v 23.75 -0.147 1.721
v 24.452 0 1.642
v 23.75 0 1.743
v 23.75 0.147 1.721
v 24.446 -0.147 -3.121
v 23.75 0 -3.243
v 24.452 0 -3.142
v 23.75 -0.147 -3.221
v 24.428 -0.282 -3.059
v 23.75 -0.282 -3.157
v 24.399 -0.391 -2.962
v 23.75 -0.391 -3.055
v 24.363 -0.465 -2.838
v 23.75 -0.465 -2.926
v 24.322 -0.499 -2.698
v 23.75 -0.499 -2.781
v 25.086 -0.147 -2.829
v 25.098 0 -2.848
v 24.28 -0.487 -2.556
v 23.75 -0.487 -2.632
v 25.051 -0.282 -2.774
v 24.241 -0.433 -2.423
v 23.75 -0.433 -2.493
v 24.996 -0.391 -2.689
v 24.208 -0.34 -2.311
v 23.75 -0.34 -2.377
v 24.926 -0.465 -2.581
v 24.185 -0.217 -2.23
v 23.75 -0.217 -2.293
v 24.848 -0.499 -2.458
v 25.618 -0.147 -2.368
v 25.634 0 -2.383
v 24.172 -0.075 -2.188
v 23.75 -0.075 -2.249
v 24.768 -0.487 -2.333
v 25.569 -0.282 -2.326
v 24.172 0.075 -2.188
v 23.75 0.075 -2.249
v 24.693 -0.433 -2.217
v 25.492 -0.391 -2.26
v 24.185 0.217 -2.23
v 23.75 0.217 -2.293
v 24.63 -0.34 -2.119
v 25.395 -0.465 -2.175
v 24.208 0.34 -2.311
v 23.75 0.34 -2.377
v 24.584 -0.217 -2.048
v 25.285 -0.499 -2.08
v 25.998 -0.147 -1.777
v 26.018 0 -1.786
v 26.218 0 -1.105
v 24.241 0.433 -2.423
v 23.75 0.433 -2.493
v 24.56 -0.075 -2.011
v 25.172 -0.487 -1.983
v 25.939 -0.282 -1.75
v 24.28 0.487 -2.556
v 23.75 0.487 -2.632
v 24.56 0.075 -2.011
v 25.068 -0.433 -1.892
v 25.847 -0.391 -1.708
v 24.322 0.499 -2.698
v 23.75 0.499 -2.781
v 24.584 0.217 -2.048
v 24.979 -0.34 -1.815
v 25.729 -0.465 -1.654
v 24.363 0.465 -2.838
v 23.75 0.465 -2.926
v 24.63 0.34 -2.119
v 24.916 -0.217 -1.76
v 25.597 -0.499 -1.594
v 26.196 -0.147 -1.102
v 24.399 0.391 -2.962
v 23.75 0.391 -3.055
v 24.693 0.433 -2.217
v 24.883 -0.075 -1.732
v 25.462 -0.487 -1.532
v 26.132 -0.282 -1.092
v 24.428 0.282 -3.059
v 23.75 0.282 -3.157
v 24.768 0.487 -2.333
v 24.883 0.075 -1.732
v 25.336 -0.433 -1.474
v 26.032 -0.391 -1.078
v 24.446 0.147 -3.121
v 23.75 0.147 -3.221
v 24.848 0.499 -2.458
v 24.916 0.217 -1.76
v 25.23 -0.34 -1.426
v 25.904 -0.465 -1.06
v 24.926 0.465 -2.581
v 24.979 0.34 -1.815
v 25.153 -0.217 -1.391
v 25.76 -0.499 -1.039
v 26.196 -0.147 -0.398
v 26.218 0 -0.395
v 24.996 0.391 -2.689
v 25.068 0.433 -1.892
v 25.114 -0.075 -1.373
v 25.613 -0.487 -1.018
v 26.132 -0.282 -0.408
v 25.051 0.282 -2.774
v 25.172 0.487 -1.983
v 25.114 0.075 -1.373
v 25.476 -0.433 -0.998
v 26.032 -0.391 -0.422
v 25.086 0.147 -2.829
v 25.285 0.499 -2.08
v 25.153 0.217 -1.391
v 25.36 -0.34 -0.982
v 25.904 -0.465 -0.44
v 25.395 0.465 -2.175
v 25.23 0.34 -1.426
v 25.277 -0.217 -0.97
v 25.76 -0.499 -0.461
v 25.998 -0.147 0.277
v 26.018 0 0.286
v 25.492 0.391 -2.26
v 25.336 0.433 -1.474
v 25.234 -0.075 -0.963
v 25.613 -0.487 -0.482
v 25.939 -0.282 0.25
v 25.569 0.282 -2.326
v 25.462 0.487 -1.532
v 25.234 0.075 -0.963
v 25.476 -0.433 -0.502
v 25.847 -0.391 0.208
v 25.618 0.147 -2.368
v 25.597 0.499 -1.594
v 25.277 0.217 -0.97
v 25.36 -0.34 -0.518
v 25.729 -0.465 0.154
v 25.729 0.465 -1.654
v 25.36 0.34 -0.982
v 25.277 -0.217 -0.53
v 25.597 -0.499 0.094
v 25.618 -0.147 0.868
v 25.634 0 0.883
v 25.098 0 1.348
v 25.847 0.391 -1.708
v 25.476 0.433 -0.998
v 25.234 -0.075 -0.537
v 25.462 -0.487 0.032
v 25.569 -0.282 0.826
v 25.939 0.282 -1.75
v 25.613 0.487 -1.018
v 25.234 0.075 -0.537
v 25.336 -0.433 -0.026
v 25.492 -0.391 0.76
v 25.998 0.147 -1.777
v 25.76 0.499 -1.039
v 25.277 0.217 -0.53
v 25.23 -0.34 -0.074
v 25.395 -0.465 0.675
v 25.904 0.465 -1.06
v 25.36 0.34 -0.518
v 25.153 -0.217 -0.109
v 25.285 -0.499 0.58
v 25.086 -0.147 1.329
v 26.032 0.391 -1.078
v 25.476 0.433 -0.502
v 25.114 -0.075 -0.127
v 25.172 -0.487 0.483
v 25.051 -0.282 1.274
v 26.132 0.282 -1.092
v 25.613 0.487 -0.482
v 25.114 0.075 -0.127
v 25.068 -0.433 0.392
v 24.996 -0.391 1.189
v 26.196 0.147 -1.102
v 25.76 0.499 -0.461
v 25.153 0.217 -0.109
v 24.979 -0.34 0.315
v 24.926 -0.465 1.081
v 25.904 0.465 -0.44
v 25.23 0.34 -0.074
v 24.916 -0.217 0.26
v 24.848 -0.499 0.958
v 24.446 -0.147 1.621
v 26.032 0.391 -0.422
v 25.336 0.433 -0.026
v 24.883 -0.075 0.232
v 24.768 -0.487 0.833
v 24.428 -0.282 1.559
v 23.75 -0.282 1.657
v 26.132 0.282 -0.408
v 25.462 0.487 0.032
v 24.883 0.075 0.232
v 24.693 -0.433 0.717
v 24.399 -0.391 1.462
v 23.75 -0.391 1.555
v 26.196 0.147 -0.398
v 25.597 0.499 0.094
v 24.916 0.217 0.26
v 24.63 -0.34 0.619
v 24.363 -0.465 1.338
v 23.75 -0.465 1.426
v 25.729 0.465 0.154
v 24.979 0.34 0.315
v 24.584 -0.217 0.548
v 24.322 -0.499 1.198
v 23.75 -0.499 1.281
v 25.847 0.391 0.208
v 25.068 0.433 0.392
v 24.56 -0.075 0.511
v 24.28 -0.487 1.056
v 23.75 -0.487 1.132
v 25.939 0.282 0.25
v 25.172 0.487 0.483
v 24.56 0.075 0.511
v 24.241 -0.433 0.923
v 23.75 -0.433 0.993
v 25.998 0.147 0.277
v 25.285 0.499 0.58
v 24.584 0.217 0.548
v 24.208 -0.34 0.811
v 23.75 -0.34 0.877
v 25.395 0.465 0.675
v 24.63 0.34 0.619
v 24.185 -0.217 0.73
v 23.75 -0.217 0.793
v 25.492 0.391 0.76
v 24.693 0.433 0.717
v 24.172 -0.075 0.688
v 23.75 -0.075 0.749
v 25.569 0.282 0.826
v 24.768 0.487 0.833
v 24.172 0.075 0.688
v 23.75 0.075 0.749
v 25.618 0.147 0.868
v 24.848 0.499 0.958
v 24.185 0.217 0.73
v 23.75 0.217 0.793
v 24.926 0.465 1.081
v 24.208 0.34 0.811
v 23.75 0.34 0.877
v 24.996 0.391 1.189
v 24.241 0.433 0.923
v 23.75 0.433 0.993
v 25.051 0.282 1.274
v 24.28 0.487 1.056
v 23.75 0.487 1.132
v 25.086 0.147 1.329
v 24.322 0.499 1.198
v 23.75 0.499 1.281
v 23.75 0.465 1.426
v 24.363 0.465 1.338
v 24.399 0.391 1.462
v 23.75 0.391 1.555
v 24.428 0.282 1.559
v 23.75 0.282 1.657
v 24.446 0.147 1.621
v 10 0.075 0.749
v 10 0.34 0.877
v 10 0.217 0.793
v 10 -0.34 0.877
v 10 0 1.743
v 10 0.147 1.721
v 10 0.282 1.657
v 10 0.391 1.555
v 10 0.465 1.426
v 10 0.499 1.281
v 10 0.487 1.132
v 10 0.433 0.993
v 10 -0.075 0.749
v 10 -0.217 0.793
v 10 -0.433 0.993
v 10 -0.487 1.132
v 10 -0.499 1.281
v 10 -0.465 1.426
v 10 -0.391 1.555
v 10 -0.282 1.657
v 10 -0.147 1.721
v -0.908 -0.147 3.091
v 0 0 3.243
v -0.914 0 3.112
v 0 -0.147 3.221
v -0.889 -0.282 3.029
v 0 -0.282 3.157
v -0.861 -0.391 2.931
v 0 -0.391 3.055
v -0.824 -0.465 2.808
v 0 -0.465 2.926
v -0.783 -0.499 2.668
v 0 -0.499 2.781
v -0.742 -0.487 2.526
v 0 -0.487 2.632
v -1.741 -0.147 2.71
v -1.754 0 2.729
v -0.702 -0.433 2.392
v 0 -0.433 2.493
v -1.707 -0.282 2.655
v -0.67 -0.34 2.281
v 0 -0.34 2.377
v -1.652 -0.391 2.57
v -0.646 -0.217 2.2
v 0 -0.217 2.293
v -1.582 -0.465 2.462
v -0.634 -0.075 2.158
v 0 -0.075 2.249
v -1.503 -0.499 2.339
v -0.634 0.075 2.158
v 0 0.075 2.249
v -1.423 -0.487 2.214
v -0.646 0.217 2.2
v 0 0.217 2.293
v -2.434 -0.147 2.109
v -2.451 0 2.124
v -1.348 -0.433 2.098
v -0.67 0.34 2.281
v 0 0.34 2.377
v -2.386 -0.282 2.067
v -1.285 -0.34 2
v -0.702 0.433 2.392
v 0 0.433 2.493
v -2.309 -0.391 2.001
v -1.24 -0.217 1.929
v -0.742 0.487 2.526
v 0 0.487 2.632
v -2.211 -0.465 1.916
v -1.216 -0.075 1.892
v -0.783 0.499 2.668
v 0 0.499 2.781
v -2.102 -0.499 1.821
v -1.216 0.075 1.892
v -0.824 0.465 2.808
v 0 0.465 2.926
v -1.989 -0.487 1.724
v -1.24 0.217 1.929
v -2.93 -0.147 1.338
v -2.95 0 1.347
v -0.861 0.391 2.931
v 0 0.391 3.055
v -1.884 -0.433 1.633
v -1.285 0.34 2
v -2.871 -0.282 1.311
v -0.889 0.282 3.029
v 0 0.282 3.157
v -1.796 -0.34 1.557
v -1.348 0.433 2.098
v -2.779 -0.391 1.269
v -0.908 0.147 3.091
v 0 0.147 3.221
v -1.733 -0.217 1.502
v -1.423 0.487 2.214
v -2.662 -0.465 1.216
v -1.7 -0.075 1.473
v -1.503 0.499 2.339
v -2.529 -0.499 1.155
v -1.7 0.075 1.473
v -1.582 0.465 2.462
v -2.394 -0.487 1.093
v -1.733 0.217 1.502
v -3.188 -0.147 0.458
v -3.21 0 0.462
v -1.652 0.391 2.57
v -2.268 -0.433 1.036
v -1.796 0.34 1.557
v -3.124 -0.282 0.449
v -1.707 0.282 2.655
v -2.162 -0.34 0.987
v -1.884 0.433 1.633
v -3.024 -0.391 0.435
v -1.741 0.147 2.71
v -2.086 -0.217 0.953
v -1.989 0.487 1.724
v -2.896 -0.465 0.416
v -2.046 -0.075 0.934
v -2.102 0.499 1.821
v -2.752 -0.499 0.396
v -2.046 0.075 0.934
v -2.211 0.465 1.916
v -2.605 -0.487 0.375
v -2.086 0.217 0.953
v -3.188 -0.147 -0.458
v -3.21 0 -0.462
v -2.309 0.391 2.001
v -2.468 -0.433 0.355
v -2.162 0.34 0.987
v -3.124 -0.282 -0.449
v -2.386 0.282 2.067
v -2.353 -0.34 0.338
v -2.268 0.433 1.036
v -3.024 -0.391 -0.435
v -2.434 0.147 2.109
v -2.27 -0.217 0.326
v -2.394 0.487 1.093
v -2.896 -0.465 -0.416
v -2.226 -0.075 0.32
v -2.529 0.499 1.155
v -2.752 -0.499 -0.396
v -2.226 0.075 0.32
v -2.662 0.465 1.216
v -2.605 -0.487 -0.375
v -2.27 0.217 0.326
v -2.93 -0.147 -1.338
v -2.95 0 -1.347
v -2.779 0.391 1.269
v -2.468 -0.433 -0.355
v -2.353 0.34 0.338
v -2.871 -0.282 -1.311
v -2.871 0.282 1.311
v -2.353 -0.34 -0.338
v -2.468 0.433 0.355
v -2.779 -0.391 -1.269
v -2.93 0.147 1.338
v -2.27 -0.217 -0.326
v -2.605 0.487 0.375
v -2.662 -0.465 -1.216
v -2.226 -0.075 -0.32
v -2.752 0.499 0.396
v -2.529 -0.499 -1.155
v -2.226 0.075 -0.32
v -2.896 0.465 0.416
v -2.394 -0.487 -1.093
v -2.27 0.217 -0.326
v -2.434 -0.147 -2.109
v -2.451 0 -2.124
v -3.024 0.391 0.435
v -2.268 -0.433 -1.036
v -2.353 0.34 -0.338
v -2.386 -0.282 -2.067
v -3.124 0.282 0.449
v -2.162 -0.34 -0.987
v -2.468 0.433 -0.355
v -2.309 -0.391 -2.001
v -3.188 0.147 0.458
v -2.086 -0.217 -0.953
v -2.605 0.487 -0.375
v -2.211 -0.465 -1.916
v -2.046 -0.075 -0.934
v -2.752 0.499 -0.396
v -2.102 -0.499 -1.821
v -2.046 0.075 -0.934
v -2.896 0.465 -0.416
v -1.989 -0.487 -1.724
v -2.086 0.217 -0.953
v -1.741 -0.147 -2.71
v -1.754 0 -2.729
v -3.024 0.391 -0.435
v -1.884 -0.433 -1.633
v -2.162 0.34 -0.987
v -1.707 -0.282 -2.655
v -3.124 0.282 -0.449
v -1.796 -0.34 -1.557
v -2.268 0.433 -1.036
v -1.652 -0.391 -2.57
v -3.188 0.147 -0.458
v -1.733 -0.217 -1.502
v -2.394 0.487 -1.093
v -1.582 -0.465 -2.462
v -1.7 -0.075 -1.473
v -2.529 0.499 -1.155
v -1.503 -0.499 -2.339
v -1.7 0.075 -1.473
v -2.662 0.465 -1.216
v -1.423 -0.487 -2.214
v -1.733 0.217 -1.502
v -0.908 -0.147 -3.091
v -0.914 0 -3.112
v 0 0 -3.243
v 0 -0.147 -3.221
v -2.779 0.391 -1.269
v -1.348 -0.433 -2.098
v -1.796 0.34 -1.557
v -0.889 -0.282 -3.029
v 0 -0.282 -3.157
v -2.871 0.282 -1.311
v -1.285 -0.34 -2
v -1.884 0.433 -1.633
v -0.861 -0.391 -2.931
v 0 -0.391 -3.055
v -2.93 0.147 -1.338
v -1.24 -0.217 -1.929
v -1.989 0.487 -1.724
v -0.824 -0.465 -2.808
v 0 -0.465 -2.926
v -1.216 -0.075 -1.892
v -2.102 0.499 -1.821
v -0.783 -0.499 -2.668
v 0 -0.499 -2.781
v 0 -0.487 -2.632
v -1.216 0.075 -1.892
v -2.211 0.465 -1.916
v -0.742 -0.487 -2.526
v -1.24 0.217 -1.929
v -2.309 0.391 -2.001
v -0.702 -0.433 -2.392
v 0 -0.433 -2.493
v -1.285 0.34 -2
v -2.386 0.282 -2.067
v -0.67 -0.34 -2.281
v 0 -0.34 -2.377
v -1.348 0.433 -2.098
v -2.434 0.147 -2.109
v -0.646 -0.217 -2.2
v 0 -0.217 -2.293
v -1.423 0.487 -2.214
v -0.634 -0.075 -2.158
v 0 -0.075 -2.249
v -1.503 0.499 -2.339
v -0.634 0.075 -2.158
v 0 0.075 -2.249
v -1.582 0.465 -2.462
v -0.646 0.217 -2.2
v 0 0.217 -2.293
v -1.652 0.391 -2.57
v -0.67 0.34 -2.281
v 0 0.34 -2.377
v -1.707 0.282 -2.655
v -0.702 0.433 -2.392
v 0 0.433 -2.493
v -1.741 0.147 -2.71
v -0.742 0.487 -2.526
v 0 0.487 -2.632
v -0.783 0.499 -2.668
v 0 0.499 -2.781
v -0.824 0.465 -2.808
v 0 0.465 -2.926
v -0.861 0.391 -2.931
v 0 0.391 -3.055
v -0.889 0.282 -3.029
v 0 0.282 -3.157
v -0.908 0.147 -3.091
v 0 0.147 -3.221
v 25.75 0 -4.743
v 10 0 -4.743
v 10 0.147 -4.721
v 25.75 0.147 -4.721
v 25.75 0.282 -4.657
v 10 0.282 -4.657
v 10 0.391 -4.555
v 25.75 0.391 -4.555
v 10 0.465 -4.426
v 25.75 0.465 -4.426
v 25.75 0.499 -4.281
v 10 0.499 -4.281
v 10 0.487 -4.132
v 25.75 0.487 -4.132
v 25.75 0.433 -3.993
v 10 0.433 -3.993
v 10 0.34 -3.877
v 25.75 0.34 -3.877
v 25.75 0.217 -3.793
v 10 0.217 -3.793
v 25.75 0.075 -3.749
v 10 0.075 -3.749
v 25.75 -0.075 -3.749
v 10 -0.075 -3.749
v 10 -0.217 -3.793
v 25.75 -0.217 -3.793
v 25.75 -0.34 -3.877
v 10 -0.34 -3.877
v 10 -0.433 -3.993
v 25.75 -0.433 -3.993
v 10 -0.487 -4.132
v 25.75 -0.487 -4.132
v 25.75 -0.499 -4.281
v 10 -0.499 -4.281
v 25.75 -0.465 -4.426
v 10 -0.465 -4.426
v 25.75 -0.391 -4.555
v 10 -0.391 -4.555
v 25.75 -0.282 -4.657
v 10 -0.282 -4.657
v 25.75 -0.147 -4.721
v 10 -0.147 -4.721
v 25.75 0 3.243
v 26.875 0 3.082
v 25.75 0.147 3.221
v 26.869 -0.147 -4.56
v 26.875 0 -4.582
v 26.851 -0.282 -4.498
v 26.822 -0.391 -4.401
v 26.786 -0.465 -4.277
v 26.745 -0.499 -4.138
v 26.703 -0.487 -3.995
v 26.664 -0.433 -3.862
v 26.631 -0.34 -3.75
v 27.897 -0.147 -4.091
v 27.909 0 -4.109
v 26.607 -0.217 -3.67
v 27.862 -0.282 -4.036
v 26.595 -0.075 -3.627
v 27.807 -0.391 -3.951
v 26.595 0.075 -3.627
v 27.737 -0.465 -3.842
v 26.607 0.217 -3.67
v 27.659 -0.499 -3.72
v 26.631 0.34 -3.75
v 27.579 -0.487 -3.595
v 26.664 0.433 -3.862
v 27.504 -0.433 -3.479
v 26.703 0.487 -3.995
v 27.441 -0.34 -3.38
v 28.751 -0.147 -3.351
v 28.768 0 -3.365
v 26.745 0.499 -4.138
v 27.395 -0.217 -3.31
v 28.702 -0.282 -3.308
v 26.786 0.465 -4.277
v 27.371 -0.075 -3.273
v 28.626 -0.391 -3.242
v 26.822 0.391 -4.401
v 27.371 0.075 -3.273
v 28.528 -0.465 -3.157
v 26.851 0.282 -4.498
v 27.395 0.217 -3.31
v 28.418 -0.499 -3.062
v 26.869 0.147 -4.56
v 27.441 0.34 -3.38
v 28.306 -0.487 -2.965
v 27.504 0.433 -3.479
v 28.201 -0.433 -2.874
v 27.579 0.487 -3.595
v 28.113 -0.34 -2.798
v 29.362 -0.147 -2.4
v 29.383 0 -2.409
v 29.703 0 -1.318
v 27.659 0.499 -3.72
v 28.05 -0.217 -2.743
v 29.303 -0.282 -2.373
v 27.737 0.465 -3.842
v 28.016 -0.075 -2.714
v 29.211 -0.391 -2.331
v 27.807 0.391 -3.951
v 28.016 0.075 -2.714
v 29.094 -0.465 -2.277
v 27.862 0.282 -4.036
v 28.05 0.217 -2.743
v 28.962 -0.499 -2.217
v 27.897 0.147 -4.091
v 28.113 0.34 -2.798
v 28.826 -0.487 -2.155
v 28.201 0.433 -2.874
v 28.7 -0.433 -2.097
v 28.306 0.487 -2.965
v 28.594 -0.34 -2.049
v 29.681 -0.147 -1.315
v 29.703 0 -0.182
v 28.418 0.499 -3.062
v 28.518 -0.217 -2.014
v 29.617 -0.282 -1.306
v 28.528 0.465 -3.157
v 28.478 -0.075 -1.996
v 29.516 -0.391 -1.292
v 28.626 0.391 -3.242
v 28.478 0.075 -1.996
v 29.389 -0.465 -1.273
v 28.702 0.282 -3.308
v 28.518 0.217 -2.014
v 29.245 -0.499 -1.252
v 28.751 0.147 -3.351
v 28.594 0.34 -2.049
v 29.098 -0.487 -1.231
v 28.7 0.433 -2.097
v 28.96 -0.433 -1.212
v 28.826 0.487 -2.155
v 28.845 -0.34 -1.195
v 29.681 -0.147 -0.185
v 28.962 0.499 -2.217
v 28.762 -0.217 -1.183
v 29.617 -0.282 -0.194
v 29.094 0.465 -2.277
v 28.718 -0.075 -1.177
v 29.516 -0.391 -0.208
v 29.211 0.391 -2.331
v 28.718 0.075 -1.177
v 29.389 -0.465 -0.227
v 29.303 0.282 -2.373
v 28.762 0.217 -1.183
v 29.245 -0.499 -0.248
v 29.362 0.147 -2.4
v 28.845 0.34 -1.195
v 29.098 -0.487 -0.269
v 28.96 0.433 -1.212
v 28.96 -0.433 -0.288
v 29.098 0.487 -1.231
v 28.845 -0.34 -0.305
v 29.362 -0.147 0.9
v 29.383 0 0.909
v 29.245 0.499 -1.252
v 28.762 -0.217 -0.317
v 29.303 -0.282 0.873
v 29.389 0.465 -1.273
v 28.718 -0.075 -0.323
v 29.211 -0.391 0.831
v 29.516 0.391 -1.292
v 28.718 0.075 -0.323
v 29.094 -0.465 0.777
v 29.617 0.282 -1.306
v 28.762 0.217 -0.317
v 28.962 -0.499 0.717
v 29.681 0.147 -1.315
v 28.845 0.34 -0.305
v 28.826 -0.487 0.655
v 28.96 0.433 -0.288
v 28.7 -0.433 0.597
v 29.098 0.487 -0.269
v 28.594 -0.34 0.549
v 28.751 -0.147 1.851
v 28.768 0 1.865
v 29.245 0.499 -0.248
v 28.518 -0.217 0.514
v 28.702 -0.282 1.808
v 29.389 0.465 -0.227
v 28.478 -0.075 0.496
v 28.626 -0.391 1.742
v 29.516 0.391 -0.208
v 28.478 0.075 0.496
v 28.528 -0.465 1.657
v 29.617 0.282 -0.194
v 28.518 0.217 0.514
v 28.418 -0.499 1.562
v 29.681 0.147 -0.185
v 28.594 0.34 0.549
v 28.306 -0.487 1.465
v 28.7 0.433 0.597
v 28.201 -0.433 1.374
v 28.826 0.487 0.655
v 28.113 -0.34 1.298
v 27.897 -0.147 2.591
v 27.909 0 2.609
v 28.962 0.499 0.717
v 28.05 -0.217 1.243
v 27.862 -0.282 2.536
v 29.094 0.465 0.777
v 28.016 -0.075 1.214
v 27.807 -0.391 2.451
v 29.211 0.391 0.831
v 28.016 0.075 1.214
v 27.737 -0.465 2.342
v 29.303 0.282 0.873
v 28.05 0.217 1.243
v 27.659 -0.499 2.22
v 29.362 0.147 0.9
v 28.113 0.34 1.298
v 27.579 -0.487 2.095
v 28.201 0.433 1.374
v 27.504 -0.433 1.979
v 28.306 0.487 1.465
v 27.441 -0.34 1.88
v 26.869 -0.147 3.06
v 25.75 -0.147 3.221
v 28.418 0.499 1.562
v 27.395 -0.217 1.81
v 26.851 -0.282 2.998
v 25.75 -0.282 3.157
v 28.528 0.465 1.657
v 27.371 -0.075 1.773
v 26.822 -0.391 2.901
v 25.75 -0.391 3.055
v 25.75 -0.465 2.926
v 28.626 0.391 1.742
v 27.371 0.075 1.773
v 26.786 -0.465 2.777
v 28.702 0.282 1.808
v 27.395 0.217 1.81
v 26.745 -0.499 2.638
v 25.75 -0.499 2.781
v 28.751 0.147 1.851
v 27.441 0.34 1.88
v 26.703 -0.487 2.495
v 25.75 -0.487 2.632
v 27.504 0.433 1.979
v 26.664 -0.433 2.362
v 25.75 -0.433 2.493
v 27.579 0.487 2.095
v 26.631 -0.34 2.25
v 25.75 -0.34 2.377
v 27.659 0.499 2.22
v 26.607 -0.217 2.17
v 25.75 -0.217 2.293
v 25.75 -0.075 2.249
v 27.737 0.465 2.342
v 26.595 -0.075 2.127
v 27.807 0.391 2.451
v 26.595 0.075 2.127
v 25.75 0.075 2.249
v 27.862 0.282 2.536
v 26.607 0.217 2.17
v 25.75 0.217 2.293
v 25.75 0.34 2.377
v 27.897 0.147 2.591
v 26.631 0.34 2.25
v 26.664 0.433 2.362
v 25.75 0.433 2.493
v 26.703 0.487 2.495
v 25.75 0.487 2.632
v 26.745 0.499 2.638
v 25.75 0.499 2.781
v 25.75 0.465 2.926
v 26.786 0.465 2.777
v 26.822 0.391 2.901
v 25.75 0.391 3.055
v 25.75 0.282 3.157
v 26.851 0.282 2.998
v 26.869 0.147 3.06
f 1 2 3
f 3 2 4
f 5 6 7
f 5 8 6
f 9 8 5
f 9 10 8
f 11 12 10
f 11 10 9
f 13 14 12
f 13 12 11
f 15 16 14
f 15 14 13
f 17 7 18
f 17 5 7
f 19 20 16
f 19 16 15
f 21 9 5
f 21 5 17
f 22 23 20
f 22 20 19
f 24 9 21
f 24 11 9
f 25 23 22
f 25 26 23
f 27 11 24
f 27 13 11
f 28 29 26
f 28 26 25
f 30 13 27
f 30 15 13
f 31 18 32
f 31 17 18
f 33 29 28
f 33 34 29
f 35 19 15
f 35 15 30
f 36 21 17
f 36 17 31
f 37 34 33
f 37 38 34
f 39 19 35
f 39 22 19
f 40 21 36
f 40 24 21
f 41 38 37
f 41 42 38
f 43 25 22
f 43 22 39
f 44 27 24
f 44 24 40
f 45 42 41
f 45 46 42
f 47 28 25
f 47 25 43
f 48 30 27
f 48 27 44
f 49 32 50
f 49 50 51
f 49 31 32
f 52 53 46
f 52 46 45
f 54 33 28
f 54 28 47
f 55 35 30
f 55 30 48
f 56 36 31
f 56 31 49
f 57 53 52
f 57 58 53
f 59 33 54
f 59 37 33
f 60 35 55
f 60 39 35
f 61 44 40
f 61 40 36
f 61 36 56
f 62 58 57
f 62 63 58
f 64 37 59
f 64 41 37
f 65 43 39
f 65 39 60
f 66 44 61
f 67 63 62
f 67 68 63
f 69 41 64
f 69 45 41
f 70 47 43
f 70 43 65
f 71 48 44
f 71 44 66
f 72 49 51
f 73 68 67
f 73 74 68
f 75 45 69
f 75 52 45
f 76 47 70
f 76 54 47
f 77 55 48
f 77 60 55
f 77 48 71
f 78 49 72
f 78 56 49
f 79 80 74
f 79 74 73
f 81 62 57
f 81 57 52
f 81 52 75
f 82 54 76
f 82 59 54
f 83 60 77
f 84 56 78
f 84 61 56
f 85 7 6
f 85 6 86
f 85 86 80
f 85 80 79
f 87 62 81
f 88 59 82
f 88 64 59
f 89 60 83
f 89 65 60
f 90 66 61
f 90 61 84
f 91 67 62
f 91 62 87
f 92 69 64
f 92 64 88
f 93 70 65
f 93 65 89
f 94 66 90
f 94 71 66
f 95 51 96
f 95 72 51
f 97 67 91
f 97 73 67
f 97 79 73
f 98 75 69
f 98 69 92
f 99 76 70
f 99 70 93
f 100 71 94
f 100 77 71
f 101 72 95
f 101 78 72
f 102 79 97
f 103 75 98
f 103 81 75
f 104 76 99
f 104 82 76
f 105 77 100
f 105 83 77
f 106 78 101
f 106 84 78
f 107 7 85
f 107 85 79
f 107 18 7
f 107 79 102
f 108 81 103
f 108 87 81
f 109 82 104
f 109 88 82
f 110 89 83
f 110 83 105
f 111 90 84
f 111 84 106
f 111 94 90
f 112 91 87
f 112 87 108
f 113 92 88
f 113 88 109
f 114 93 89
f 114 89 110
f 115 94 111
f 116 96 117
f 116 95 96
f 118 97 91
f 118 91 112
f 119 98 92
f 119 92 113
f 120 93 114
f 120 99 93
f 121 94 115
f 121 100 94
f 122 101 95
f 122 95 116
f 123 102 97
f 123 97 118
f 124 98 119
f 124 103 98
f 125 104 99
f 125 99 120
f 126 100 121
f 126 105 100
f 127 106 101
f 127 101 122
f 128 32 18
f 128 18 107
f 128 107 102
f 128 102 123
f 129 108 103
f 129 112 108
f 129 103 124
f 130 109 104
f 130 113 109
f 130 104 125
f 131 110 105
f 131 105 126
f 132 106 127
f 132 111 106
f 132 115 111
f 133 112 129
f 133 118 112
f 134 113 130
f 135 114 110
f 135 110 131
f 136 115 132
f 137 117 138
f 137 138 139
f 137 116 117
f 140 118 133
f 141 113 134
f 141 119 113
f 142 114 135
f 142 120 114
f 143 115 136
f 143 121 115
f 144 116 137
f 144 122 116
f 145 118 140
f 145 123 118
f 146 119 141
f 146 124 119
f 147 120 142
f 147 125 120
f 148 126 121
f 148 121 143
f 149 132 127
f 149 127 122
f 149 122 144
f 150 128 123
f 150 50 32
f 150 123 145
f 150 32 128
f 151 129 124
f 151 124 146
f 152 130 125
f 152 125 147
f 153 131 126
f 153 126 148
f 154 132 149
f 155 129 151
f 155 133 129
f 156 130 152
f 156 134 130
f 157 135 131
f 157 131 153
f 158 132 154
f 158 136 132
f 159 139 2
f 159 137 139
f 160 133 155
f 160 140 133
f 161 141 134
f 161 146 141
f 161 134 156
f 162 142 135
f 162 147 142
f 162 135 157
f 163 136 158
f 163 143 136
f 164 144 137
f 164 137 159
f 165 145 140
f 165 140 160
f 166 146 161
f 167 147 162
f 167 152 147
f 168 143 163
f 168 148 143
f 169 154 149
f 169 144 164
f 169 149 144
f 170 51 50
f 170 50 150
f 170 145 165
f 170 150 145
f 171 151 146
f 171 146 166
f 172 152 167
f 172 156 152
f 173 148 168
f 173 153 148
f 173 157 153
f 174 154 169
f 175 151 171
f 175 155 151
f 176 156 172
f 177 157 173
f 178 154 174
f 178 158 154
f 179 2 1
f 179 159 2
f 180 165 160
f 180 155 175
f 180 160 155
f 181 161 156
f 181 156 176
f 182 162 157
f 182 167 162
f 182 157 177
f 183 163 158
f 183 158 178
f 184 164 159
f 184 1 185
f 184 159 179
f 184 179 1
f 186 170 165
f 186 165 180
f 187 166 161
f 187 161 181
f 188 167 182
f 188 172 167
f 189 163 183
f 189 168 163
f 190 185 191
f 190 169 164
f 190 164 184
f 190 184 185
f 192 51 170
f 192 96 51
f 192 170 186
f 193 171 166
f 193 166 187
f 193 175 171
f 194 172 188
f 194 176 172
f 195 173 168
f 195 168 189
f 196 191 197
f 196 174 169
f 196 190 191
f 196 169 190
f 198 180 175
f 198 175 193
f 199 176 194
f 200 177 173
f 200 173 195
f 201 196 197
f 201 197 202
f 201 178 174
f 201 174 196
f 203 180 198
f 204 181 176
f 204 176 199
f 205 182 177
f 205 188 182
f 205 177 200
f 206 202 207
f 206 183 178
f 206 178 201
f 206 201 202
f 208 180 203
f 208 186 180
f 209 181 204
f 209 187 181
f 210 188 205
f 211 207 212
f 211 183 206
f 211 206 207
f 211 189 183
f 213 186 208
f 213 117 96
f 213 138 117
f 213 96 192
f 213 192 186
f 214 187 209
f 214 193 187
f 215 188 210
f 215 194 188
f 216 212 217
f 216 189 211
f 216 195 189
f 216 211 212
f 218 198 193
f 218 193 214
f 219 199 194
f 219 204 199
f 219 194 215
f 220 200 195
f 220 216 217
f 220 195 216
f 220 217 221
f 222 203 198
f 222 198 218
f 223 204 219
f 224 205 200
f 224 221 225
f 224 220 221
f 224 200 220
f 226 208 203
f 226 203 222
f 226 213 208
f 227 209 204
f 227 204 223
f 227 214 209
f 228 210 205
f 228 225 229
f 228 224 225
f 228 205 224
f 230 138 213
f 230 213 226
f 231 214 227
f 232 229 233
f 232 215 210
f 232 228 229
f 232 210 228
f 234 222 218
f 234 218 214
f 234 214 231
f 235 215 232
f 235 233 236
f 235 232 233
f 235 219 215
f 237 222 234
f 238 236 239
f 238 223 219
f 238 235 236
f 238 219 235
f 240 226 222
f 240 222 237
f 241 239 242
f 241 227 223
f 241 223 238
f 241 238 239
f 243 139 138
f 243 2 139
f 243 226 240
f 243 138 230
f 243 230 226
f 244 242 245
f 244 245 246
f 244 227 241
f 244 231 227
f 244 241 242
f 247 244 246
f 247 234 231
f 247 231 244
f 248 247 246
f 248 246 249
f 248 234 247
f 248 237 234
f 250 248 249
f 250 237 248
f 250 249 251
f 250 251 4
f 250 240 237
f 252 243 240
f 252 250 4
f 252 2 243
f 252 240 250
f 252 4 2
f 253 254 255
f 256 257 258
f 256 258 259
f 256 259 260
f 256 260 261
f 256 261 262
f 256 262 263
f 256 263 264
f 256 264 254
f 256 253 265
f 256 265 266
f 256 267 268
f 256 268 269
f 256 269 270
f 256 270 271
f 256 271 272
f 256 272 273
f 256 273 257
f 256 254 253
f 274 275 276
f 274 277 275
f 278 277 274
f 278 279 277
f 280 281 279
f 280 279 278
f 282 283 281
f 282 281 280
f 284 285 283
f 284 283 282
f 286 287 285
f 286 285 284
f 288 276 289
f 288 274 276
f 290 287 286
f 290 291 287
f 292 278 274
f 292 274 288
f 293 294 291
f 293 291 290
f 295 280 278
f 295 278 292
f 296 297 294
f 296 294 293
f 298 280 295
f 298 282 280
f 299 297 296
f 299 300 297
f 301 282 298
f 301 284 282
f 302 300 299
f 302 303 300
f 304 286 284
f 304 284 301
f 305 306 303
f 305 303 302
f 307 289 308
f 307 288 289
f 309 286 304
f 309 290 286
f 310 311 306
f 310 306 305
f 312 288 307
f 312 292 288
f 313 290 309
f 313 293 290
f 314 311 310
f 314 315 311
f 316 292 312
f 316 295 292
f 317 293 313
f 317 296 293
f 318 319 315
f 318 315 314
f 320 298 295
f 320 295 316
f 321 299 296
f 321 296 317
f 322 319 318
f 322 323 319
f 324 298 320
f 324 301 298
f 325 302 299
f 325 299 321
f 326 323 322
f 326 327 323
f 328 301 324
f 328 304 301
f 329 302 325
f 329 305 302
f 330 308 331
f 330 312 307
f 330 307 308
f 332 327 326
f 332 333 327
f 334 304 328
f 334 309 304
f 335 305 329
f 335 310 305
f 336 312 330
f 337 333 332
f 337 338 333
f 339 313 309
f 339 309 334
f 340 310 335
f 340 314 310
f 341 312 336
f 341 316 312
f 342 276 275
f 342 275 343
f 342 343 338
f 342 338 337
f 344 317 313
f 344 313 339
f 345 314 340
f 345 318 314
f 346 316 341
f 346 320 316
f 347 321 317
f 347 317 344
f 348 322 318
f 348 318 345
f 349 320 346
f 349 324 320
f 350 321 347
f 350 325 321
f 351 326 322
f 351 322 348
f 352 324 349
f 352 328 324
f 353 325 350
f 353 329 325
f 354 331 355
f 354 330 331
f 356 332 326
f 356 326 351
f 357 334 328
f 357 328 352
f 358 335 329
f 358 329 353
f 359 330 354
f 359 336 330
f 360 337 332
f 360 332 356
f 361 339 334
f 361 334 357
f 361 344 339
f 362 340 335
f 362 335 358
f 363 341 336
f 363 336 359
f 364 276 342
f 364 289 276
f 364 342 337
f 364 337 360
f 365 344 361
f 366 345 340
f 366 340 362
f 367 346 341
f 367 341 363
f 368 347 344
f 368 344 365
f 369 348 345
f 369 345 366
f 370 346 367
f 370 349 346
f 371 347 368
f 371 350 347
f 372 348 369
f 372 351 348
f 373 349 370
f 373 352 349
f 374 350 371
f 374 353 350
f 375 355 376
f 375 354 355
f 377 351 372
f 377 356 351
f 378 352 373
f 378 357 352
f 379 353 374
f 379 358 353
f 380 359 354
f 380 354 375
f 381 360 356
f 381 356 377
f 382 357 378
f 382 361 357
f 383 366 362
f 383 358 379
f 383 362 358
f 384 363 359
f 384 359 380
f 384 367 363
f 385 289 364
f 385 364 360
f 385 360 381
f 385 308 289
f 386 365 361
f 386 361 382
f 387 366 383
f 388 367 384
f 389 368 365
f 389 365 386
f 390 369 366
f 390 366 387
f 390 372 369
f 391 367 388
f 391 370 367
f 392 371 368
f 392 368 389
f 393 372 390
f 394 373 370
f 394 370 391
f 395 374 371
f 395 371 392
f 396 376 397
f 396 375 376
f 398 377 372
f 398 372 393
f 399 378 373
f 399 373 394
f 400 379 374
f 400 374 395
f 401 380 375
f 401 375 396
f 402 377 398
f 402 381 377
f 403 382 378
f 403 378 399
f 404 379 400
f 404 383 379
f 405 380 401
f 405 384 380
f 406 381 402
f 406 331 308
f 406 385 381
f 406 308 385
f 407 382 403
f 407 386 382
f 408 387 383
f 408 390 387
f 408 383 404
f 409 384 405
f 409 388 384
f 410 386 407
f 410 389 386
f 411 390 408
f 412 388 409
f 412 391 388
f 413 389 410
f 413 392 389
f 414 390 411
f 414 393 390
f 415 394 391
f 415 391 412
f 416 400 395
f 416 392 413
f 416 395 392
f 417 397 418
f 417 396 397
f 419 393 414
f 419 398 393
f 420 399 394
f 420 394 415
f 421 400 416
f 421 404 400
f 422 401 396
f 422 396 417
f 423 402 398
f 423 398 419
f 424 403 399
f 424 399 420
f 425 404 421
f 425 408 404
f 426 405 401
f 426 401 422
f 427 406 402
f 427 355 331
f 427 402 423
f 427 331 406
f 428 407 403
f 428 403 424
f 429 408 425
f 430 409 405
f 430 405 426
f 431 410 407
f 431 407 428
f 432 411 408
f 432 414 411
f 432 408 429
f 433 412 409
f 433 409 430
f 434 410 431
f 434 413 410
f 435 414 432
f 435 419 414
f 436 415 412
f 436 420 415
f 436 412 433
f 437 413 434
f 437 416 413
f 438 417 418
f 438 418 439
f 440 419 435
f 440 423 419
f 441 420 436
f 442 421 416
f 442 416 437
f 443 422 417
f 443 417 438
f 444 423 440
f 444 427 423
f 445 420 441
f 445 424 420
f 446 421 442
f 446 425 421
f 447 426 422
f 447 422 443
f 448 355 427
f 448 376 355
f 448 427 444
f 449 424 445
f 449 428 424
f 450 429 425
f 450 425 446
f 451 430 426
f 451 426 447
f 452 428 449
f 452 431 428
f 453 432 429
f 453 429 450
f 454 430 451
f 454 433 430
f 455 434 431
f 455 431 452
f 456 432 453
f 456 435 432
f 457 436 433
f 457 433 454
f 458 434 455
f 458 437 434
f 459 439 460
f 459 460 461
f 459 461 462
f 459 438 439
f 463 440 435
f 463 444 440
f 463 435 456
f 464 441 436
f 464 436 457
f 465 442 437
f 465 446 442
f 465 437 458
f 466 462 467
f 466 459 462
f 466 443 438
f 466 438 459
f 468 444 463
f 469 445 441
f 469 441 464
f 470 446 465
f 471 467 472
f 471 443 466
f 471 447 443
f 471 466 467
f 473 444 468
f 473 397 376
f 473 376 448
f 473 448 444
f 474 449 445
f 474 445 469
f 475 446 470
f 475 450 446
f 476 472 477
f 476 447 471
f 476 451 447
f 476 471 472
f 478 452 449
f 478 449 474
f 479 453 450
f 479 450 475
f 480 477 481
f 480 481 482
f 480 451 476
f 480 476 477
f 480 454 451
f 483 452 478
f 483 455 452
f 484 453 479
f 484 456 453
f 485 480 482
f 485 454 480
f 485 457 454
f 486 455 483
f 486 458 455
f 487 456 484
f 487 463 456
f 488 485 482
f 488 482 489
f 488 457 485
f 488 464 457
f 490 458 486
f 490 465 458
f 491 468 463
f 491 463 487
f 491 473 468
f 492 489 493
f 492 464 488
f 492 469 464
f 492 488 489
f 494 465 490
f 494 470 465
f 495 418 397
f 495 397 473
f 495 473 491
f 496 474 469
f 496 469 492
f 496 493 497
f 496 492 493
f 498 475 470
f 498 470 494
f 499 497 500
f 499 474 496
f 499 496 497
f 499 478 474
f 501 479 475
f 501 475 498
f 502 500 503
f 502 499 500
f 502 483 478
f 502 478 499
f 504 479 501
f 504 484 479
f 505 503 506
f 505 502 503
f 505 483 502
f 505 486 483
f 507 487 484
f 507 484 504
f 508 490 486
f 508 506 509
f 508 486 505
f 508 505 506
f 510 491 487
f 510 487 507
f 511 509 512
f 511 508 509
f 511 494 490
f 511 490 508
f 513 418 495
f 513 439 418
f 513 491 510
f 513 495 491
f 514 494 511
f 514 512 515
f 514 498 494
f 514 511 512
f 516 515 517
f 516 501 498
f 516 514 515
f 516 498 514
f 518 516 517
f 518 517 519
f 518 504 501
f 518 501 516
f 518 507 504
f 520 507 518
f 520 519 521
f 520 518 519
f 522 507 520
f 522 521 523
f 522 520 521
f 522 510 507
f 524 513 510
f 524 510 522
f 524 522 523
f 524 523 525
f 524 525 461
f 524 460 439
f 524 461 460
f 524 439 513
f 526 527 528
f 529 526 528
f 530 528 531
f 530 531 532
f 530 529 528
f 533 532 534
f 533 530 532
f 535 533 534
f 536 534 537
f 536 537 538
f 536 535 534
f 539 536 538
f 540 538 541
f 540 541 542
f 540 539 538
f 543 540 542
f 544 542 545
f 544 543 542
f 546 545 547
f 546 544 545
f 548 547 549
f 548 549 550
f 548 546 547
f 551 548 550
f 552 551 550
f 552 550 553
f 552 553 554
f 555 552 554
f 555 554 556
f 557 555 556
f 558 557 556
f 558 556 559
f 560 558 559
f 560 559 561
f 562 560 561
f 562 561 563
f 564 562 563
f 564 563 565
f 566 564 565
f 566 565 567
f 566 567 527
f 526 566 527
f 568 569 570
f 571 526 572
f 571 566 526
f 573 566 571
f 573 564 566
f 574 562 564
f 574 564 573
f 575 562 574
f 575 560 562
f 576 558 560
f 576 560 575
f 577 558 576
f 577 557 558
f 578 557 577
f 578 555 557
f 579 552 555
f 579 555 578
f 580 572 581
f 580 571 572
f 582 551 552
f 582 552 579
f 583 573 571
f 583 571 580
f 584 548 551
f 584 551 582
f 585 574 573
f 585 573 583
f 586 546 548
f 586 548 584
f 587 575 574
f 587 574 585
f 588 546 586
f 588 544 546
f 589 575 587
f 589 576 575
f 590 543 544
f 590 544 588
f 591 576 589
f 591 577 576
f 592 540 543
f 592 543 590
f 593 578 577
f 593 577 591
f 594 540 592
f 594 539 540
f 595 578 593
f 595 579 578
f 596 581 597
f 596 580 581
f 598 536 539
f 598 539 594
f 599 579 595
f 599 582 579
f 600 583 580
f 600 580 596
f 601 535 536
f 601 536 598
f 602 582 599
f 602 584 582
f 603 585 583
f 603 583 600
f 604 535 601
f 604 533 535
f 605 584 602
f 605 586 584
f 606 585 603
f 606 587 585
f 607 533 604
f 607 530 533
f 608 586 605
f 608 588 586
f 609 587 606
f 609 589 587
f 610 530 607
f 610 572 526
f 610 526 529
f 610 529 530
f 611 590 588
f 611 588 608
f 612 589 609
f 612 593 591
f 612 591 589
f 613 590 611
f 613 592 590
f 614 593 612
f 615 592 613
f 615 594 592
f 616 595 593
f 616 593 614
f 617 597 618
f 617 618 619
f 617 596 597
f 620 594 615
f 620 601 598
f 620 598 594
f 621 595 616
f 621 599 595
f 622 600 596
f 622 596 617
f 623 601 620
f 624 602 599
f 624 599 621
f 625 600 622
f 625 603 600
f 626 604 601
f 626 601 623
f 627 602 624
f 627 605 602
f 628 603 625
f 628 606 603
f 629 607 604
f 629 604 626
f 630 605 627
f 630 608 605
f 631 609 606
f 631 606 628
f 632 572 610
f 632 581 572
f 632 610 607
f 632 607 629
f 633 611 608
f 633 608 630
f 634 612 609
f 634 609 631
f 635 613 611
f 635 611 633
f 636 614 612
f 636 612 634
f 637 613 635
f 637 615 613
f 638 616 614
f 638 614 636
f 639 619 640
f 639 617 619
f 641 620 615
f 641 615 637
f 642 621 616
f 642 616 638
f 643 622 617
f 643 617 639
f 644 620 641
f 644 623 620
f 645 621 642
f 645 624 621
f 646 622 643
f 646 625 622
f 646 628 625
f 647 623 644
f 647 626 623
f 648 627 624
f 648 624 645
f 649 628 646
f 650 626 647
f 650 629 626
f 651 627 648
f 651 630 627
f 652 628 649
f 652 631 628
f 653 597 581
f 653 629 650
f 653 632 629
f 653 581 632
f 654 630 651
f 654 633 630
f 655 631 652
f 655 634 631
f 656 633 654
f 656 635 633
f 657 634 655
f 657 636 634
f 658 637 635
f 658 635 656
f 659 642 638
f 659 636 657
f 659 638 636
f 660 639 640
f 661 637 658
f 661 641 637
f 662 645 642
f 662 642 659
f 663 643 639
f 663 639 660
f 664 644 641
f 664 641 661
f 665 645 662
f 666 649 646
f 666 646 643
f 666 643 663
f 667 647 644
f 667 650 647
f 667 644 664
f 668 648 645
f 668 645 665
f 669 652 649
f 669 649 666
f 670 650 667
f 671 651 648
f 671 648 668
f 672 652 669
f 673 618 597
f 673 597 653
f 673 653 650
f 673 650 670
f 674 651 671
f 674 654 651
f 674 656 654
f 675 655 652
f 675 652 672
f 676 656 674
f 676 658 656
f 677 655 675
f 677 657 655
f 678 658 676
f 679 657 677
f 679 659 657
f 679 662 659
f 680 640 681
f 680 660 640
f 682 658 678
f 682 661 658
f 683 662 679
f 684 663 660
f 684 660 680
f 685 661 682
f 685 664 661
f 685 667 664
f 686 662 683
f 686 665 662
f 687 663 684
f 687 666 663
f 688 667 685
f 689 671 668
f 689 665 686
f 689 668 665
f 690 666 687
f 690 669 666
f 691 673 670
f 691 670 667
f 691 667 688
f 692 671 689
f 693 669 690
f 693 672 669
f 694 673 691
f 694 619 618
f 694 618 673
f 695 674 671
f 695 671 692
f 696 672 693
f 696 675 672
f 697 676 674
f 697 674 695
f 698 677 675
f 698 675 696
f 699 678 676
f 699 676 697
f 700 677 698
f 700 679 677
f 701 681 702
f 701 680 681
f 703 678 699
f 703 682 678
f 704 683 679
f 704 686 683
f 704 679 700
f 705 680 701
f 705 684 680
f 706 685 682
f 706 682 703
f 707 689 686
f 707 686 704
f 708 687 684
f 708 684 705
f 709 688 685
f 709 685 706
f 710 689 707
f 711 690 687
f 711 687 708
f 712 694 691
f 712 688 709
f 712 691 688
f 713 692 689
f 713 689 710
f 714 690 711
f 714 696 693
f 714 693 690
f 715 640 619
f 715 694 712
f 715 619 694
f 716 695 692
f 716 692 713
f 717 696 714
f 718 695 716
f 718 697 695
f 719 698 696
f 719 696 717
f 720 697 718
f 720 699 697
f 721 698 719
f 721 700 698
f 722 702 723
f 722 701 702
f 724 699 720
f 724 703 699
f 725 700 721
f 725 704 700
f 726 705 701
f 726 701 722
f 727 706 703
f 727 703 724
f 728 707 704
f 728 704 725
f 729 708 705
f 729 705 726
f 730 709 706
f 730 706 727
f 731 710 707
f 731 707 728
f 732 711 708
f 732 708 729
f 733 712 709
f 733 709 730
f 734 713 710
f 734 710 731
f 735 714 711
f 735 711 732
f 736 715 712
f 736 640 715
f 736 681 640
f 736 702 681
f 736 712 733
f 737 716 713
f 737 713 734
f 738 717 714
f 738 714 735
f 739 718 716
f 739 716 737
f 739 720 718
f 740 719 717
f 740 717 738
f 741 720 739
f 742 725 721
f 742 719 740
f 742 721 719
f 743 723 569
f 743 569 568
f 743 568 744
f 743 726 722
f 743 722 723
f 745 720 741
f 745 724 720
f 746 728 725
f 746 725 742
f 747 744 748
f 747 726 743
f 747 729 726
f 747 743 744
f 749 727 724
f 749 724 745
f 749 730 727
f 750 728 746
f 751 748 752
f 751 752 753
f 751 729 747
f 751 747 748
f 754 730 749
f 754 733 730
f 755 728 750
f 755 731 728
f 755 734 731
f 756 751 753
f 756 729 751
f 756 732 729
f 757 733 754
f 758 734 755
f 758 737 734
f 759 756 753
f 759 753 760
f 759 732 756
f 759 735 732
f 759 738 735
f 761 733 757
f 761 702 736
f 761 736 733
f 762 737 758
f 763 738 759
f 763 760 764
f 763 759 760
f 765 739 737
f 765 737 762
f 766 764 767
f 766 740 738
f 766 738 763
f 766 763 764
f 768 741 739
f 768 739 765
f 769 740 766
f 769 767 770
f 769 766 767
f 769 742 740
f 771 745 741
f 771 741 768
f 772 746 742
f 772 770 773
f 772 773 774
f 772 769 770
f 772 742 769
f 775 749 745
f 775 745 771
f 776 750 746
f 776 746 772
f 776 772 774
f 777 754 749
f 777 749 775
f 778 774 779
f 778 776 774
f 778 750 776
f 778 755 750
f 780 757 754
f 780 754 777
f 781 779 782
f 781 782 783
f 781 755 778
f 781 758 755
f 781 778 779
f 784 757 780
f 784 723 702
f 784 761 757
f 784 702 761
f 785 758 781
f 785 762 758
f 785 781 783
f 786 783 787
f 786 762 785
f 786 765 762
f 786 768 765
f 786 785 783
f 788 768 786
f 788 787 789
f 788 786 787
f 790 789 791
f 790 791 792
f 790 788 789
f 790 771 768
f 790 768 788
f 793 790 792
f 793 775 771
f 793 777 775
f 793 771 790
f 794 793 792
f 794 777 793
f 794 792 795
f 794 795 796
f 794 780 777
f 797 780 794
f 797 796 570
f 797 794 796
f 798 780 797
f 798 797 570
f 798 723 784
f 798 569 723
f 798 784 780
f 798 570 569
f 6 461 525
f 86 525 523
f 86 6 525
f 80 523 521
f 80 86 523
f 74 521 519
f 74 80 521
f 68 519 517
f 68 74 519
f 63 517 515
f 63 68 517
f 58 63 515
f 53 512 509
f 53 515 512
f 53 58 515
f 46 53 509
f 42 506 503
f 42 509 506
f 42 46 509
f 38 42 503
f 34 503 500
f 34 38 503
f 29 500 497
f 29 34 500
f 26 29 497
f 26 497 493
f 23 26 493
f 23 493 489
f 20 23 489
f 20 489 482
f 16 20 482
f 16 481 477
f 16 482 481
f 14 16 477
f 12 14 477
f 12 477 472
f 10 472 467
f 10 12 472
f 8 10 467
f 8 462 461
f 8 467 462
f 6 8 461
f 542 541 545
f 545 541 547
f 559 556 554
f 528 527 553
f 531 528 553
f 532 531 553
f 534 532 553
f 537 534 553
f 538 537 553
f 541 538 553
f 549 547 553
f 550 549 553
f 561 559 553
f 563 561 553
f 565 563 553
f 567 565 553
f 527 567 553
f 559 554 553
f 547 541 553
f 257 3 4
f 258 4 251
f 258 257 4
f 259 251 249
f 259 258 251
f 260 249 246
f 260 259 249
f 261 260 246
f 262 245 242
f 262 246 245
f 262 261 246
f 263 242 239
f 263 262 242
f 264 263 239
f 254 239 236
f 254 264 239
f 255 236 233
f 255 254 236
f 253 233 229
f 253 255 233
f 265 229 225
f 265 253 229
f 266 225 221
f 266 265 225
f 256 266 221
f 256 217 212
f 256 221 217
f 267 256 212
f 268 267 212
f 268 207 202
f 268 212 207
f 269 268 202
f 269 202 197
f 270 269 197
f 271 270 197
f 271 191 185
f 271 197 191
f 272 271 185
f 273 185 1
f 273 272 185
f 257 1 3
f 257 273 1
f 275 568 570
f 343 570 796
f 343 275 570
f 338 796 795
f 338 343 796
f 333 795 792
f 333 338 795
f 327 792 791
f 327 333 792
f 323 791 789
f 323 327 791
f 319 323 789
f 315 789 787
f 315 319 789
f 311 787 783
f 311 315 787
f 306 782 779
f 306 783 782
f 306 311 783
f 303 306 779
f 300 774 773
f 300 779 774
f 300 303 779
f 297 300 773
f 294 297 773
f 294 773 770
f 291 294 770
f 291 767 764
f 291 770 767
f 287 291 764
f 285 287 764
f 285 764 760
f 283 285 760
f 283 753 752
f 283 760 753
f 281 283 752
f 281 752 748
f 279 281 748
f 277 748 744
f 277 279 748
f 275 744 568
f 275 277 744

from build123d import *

# Parameters (mm, degrees)
SKETCH2_R = 0.5


with BuildPart() as part:
    # Sweep1: sweep along a path in Sketch1
    with BuildLine(Plane(origin=(0, 0, 0), x_dir=(1, 0, 0), z_dir=(0, 1, 0))) as sweep1_path:
        Line((10, 4.25), (25.75, 4.25))
        ThreePointArc((25.75, 4.25), (29.25, 0.75), (25.75, -2.75))
        Line((25.75, -2.75), (0, -2.75))
        ThreePointArc((0, -2.75), (-2.75, 0), (0, 2.75))
        Line((0, 2.75), (23.75, 2.75))
        ThreePointArc((23.75, 2.75), (25.75, 0.75), (23.75, -1.25))
        Line((23.75, -1.25), (10, -1.25))
    # Sketch2 → Sweep1 (sweep)
    with BuildSketch(Plane(origin=(10, 0, -4.25), x_dir=(0, 0, -1), z_dir=(1, 0, 0))):
        with Locations((-0.006617862, 0)):
            Circle(SKETCH2_R)
    sweep(path=sweep1_path.line)


solid = part.part
